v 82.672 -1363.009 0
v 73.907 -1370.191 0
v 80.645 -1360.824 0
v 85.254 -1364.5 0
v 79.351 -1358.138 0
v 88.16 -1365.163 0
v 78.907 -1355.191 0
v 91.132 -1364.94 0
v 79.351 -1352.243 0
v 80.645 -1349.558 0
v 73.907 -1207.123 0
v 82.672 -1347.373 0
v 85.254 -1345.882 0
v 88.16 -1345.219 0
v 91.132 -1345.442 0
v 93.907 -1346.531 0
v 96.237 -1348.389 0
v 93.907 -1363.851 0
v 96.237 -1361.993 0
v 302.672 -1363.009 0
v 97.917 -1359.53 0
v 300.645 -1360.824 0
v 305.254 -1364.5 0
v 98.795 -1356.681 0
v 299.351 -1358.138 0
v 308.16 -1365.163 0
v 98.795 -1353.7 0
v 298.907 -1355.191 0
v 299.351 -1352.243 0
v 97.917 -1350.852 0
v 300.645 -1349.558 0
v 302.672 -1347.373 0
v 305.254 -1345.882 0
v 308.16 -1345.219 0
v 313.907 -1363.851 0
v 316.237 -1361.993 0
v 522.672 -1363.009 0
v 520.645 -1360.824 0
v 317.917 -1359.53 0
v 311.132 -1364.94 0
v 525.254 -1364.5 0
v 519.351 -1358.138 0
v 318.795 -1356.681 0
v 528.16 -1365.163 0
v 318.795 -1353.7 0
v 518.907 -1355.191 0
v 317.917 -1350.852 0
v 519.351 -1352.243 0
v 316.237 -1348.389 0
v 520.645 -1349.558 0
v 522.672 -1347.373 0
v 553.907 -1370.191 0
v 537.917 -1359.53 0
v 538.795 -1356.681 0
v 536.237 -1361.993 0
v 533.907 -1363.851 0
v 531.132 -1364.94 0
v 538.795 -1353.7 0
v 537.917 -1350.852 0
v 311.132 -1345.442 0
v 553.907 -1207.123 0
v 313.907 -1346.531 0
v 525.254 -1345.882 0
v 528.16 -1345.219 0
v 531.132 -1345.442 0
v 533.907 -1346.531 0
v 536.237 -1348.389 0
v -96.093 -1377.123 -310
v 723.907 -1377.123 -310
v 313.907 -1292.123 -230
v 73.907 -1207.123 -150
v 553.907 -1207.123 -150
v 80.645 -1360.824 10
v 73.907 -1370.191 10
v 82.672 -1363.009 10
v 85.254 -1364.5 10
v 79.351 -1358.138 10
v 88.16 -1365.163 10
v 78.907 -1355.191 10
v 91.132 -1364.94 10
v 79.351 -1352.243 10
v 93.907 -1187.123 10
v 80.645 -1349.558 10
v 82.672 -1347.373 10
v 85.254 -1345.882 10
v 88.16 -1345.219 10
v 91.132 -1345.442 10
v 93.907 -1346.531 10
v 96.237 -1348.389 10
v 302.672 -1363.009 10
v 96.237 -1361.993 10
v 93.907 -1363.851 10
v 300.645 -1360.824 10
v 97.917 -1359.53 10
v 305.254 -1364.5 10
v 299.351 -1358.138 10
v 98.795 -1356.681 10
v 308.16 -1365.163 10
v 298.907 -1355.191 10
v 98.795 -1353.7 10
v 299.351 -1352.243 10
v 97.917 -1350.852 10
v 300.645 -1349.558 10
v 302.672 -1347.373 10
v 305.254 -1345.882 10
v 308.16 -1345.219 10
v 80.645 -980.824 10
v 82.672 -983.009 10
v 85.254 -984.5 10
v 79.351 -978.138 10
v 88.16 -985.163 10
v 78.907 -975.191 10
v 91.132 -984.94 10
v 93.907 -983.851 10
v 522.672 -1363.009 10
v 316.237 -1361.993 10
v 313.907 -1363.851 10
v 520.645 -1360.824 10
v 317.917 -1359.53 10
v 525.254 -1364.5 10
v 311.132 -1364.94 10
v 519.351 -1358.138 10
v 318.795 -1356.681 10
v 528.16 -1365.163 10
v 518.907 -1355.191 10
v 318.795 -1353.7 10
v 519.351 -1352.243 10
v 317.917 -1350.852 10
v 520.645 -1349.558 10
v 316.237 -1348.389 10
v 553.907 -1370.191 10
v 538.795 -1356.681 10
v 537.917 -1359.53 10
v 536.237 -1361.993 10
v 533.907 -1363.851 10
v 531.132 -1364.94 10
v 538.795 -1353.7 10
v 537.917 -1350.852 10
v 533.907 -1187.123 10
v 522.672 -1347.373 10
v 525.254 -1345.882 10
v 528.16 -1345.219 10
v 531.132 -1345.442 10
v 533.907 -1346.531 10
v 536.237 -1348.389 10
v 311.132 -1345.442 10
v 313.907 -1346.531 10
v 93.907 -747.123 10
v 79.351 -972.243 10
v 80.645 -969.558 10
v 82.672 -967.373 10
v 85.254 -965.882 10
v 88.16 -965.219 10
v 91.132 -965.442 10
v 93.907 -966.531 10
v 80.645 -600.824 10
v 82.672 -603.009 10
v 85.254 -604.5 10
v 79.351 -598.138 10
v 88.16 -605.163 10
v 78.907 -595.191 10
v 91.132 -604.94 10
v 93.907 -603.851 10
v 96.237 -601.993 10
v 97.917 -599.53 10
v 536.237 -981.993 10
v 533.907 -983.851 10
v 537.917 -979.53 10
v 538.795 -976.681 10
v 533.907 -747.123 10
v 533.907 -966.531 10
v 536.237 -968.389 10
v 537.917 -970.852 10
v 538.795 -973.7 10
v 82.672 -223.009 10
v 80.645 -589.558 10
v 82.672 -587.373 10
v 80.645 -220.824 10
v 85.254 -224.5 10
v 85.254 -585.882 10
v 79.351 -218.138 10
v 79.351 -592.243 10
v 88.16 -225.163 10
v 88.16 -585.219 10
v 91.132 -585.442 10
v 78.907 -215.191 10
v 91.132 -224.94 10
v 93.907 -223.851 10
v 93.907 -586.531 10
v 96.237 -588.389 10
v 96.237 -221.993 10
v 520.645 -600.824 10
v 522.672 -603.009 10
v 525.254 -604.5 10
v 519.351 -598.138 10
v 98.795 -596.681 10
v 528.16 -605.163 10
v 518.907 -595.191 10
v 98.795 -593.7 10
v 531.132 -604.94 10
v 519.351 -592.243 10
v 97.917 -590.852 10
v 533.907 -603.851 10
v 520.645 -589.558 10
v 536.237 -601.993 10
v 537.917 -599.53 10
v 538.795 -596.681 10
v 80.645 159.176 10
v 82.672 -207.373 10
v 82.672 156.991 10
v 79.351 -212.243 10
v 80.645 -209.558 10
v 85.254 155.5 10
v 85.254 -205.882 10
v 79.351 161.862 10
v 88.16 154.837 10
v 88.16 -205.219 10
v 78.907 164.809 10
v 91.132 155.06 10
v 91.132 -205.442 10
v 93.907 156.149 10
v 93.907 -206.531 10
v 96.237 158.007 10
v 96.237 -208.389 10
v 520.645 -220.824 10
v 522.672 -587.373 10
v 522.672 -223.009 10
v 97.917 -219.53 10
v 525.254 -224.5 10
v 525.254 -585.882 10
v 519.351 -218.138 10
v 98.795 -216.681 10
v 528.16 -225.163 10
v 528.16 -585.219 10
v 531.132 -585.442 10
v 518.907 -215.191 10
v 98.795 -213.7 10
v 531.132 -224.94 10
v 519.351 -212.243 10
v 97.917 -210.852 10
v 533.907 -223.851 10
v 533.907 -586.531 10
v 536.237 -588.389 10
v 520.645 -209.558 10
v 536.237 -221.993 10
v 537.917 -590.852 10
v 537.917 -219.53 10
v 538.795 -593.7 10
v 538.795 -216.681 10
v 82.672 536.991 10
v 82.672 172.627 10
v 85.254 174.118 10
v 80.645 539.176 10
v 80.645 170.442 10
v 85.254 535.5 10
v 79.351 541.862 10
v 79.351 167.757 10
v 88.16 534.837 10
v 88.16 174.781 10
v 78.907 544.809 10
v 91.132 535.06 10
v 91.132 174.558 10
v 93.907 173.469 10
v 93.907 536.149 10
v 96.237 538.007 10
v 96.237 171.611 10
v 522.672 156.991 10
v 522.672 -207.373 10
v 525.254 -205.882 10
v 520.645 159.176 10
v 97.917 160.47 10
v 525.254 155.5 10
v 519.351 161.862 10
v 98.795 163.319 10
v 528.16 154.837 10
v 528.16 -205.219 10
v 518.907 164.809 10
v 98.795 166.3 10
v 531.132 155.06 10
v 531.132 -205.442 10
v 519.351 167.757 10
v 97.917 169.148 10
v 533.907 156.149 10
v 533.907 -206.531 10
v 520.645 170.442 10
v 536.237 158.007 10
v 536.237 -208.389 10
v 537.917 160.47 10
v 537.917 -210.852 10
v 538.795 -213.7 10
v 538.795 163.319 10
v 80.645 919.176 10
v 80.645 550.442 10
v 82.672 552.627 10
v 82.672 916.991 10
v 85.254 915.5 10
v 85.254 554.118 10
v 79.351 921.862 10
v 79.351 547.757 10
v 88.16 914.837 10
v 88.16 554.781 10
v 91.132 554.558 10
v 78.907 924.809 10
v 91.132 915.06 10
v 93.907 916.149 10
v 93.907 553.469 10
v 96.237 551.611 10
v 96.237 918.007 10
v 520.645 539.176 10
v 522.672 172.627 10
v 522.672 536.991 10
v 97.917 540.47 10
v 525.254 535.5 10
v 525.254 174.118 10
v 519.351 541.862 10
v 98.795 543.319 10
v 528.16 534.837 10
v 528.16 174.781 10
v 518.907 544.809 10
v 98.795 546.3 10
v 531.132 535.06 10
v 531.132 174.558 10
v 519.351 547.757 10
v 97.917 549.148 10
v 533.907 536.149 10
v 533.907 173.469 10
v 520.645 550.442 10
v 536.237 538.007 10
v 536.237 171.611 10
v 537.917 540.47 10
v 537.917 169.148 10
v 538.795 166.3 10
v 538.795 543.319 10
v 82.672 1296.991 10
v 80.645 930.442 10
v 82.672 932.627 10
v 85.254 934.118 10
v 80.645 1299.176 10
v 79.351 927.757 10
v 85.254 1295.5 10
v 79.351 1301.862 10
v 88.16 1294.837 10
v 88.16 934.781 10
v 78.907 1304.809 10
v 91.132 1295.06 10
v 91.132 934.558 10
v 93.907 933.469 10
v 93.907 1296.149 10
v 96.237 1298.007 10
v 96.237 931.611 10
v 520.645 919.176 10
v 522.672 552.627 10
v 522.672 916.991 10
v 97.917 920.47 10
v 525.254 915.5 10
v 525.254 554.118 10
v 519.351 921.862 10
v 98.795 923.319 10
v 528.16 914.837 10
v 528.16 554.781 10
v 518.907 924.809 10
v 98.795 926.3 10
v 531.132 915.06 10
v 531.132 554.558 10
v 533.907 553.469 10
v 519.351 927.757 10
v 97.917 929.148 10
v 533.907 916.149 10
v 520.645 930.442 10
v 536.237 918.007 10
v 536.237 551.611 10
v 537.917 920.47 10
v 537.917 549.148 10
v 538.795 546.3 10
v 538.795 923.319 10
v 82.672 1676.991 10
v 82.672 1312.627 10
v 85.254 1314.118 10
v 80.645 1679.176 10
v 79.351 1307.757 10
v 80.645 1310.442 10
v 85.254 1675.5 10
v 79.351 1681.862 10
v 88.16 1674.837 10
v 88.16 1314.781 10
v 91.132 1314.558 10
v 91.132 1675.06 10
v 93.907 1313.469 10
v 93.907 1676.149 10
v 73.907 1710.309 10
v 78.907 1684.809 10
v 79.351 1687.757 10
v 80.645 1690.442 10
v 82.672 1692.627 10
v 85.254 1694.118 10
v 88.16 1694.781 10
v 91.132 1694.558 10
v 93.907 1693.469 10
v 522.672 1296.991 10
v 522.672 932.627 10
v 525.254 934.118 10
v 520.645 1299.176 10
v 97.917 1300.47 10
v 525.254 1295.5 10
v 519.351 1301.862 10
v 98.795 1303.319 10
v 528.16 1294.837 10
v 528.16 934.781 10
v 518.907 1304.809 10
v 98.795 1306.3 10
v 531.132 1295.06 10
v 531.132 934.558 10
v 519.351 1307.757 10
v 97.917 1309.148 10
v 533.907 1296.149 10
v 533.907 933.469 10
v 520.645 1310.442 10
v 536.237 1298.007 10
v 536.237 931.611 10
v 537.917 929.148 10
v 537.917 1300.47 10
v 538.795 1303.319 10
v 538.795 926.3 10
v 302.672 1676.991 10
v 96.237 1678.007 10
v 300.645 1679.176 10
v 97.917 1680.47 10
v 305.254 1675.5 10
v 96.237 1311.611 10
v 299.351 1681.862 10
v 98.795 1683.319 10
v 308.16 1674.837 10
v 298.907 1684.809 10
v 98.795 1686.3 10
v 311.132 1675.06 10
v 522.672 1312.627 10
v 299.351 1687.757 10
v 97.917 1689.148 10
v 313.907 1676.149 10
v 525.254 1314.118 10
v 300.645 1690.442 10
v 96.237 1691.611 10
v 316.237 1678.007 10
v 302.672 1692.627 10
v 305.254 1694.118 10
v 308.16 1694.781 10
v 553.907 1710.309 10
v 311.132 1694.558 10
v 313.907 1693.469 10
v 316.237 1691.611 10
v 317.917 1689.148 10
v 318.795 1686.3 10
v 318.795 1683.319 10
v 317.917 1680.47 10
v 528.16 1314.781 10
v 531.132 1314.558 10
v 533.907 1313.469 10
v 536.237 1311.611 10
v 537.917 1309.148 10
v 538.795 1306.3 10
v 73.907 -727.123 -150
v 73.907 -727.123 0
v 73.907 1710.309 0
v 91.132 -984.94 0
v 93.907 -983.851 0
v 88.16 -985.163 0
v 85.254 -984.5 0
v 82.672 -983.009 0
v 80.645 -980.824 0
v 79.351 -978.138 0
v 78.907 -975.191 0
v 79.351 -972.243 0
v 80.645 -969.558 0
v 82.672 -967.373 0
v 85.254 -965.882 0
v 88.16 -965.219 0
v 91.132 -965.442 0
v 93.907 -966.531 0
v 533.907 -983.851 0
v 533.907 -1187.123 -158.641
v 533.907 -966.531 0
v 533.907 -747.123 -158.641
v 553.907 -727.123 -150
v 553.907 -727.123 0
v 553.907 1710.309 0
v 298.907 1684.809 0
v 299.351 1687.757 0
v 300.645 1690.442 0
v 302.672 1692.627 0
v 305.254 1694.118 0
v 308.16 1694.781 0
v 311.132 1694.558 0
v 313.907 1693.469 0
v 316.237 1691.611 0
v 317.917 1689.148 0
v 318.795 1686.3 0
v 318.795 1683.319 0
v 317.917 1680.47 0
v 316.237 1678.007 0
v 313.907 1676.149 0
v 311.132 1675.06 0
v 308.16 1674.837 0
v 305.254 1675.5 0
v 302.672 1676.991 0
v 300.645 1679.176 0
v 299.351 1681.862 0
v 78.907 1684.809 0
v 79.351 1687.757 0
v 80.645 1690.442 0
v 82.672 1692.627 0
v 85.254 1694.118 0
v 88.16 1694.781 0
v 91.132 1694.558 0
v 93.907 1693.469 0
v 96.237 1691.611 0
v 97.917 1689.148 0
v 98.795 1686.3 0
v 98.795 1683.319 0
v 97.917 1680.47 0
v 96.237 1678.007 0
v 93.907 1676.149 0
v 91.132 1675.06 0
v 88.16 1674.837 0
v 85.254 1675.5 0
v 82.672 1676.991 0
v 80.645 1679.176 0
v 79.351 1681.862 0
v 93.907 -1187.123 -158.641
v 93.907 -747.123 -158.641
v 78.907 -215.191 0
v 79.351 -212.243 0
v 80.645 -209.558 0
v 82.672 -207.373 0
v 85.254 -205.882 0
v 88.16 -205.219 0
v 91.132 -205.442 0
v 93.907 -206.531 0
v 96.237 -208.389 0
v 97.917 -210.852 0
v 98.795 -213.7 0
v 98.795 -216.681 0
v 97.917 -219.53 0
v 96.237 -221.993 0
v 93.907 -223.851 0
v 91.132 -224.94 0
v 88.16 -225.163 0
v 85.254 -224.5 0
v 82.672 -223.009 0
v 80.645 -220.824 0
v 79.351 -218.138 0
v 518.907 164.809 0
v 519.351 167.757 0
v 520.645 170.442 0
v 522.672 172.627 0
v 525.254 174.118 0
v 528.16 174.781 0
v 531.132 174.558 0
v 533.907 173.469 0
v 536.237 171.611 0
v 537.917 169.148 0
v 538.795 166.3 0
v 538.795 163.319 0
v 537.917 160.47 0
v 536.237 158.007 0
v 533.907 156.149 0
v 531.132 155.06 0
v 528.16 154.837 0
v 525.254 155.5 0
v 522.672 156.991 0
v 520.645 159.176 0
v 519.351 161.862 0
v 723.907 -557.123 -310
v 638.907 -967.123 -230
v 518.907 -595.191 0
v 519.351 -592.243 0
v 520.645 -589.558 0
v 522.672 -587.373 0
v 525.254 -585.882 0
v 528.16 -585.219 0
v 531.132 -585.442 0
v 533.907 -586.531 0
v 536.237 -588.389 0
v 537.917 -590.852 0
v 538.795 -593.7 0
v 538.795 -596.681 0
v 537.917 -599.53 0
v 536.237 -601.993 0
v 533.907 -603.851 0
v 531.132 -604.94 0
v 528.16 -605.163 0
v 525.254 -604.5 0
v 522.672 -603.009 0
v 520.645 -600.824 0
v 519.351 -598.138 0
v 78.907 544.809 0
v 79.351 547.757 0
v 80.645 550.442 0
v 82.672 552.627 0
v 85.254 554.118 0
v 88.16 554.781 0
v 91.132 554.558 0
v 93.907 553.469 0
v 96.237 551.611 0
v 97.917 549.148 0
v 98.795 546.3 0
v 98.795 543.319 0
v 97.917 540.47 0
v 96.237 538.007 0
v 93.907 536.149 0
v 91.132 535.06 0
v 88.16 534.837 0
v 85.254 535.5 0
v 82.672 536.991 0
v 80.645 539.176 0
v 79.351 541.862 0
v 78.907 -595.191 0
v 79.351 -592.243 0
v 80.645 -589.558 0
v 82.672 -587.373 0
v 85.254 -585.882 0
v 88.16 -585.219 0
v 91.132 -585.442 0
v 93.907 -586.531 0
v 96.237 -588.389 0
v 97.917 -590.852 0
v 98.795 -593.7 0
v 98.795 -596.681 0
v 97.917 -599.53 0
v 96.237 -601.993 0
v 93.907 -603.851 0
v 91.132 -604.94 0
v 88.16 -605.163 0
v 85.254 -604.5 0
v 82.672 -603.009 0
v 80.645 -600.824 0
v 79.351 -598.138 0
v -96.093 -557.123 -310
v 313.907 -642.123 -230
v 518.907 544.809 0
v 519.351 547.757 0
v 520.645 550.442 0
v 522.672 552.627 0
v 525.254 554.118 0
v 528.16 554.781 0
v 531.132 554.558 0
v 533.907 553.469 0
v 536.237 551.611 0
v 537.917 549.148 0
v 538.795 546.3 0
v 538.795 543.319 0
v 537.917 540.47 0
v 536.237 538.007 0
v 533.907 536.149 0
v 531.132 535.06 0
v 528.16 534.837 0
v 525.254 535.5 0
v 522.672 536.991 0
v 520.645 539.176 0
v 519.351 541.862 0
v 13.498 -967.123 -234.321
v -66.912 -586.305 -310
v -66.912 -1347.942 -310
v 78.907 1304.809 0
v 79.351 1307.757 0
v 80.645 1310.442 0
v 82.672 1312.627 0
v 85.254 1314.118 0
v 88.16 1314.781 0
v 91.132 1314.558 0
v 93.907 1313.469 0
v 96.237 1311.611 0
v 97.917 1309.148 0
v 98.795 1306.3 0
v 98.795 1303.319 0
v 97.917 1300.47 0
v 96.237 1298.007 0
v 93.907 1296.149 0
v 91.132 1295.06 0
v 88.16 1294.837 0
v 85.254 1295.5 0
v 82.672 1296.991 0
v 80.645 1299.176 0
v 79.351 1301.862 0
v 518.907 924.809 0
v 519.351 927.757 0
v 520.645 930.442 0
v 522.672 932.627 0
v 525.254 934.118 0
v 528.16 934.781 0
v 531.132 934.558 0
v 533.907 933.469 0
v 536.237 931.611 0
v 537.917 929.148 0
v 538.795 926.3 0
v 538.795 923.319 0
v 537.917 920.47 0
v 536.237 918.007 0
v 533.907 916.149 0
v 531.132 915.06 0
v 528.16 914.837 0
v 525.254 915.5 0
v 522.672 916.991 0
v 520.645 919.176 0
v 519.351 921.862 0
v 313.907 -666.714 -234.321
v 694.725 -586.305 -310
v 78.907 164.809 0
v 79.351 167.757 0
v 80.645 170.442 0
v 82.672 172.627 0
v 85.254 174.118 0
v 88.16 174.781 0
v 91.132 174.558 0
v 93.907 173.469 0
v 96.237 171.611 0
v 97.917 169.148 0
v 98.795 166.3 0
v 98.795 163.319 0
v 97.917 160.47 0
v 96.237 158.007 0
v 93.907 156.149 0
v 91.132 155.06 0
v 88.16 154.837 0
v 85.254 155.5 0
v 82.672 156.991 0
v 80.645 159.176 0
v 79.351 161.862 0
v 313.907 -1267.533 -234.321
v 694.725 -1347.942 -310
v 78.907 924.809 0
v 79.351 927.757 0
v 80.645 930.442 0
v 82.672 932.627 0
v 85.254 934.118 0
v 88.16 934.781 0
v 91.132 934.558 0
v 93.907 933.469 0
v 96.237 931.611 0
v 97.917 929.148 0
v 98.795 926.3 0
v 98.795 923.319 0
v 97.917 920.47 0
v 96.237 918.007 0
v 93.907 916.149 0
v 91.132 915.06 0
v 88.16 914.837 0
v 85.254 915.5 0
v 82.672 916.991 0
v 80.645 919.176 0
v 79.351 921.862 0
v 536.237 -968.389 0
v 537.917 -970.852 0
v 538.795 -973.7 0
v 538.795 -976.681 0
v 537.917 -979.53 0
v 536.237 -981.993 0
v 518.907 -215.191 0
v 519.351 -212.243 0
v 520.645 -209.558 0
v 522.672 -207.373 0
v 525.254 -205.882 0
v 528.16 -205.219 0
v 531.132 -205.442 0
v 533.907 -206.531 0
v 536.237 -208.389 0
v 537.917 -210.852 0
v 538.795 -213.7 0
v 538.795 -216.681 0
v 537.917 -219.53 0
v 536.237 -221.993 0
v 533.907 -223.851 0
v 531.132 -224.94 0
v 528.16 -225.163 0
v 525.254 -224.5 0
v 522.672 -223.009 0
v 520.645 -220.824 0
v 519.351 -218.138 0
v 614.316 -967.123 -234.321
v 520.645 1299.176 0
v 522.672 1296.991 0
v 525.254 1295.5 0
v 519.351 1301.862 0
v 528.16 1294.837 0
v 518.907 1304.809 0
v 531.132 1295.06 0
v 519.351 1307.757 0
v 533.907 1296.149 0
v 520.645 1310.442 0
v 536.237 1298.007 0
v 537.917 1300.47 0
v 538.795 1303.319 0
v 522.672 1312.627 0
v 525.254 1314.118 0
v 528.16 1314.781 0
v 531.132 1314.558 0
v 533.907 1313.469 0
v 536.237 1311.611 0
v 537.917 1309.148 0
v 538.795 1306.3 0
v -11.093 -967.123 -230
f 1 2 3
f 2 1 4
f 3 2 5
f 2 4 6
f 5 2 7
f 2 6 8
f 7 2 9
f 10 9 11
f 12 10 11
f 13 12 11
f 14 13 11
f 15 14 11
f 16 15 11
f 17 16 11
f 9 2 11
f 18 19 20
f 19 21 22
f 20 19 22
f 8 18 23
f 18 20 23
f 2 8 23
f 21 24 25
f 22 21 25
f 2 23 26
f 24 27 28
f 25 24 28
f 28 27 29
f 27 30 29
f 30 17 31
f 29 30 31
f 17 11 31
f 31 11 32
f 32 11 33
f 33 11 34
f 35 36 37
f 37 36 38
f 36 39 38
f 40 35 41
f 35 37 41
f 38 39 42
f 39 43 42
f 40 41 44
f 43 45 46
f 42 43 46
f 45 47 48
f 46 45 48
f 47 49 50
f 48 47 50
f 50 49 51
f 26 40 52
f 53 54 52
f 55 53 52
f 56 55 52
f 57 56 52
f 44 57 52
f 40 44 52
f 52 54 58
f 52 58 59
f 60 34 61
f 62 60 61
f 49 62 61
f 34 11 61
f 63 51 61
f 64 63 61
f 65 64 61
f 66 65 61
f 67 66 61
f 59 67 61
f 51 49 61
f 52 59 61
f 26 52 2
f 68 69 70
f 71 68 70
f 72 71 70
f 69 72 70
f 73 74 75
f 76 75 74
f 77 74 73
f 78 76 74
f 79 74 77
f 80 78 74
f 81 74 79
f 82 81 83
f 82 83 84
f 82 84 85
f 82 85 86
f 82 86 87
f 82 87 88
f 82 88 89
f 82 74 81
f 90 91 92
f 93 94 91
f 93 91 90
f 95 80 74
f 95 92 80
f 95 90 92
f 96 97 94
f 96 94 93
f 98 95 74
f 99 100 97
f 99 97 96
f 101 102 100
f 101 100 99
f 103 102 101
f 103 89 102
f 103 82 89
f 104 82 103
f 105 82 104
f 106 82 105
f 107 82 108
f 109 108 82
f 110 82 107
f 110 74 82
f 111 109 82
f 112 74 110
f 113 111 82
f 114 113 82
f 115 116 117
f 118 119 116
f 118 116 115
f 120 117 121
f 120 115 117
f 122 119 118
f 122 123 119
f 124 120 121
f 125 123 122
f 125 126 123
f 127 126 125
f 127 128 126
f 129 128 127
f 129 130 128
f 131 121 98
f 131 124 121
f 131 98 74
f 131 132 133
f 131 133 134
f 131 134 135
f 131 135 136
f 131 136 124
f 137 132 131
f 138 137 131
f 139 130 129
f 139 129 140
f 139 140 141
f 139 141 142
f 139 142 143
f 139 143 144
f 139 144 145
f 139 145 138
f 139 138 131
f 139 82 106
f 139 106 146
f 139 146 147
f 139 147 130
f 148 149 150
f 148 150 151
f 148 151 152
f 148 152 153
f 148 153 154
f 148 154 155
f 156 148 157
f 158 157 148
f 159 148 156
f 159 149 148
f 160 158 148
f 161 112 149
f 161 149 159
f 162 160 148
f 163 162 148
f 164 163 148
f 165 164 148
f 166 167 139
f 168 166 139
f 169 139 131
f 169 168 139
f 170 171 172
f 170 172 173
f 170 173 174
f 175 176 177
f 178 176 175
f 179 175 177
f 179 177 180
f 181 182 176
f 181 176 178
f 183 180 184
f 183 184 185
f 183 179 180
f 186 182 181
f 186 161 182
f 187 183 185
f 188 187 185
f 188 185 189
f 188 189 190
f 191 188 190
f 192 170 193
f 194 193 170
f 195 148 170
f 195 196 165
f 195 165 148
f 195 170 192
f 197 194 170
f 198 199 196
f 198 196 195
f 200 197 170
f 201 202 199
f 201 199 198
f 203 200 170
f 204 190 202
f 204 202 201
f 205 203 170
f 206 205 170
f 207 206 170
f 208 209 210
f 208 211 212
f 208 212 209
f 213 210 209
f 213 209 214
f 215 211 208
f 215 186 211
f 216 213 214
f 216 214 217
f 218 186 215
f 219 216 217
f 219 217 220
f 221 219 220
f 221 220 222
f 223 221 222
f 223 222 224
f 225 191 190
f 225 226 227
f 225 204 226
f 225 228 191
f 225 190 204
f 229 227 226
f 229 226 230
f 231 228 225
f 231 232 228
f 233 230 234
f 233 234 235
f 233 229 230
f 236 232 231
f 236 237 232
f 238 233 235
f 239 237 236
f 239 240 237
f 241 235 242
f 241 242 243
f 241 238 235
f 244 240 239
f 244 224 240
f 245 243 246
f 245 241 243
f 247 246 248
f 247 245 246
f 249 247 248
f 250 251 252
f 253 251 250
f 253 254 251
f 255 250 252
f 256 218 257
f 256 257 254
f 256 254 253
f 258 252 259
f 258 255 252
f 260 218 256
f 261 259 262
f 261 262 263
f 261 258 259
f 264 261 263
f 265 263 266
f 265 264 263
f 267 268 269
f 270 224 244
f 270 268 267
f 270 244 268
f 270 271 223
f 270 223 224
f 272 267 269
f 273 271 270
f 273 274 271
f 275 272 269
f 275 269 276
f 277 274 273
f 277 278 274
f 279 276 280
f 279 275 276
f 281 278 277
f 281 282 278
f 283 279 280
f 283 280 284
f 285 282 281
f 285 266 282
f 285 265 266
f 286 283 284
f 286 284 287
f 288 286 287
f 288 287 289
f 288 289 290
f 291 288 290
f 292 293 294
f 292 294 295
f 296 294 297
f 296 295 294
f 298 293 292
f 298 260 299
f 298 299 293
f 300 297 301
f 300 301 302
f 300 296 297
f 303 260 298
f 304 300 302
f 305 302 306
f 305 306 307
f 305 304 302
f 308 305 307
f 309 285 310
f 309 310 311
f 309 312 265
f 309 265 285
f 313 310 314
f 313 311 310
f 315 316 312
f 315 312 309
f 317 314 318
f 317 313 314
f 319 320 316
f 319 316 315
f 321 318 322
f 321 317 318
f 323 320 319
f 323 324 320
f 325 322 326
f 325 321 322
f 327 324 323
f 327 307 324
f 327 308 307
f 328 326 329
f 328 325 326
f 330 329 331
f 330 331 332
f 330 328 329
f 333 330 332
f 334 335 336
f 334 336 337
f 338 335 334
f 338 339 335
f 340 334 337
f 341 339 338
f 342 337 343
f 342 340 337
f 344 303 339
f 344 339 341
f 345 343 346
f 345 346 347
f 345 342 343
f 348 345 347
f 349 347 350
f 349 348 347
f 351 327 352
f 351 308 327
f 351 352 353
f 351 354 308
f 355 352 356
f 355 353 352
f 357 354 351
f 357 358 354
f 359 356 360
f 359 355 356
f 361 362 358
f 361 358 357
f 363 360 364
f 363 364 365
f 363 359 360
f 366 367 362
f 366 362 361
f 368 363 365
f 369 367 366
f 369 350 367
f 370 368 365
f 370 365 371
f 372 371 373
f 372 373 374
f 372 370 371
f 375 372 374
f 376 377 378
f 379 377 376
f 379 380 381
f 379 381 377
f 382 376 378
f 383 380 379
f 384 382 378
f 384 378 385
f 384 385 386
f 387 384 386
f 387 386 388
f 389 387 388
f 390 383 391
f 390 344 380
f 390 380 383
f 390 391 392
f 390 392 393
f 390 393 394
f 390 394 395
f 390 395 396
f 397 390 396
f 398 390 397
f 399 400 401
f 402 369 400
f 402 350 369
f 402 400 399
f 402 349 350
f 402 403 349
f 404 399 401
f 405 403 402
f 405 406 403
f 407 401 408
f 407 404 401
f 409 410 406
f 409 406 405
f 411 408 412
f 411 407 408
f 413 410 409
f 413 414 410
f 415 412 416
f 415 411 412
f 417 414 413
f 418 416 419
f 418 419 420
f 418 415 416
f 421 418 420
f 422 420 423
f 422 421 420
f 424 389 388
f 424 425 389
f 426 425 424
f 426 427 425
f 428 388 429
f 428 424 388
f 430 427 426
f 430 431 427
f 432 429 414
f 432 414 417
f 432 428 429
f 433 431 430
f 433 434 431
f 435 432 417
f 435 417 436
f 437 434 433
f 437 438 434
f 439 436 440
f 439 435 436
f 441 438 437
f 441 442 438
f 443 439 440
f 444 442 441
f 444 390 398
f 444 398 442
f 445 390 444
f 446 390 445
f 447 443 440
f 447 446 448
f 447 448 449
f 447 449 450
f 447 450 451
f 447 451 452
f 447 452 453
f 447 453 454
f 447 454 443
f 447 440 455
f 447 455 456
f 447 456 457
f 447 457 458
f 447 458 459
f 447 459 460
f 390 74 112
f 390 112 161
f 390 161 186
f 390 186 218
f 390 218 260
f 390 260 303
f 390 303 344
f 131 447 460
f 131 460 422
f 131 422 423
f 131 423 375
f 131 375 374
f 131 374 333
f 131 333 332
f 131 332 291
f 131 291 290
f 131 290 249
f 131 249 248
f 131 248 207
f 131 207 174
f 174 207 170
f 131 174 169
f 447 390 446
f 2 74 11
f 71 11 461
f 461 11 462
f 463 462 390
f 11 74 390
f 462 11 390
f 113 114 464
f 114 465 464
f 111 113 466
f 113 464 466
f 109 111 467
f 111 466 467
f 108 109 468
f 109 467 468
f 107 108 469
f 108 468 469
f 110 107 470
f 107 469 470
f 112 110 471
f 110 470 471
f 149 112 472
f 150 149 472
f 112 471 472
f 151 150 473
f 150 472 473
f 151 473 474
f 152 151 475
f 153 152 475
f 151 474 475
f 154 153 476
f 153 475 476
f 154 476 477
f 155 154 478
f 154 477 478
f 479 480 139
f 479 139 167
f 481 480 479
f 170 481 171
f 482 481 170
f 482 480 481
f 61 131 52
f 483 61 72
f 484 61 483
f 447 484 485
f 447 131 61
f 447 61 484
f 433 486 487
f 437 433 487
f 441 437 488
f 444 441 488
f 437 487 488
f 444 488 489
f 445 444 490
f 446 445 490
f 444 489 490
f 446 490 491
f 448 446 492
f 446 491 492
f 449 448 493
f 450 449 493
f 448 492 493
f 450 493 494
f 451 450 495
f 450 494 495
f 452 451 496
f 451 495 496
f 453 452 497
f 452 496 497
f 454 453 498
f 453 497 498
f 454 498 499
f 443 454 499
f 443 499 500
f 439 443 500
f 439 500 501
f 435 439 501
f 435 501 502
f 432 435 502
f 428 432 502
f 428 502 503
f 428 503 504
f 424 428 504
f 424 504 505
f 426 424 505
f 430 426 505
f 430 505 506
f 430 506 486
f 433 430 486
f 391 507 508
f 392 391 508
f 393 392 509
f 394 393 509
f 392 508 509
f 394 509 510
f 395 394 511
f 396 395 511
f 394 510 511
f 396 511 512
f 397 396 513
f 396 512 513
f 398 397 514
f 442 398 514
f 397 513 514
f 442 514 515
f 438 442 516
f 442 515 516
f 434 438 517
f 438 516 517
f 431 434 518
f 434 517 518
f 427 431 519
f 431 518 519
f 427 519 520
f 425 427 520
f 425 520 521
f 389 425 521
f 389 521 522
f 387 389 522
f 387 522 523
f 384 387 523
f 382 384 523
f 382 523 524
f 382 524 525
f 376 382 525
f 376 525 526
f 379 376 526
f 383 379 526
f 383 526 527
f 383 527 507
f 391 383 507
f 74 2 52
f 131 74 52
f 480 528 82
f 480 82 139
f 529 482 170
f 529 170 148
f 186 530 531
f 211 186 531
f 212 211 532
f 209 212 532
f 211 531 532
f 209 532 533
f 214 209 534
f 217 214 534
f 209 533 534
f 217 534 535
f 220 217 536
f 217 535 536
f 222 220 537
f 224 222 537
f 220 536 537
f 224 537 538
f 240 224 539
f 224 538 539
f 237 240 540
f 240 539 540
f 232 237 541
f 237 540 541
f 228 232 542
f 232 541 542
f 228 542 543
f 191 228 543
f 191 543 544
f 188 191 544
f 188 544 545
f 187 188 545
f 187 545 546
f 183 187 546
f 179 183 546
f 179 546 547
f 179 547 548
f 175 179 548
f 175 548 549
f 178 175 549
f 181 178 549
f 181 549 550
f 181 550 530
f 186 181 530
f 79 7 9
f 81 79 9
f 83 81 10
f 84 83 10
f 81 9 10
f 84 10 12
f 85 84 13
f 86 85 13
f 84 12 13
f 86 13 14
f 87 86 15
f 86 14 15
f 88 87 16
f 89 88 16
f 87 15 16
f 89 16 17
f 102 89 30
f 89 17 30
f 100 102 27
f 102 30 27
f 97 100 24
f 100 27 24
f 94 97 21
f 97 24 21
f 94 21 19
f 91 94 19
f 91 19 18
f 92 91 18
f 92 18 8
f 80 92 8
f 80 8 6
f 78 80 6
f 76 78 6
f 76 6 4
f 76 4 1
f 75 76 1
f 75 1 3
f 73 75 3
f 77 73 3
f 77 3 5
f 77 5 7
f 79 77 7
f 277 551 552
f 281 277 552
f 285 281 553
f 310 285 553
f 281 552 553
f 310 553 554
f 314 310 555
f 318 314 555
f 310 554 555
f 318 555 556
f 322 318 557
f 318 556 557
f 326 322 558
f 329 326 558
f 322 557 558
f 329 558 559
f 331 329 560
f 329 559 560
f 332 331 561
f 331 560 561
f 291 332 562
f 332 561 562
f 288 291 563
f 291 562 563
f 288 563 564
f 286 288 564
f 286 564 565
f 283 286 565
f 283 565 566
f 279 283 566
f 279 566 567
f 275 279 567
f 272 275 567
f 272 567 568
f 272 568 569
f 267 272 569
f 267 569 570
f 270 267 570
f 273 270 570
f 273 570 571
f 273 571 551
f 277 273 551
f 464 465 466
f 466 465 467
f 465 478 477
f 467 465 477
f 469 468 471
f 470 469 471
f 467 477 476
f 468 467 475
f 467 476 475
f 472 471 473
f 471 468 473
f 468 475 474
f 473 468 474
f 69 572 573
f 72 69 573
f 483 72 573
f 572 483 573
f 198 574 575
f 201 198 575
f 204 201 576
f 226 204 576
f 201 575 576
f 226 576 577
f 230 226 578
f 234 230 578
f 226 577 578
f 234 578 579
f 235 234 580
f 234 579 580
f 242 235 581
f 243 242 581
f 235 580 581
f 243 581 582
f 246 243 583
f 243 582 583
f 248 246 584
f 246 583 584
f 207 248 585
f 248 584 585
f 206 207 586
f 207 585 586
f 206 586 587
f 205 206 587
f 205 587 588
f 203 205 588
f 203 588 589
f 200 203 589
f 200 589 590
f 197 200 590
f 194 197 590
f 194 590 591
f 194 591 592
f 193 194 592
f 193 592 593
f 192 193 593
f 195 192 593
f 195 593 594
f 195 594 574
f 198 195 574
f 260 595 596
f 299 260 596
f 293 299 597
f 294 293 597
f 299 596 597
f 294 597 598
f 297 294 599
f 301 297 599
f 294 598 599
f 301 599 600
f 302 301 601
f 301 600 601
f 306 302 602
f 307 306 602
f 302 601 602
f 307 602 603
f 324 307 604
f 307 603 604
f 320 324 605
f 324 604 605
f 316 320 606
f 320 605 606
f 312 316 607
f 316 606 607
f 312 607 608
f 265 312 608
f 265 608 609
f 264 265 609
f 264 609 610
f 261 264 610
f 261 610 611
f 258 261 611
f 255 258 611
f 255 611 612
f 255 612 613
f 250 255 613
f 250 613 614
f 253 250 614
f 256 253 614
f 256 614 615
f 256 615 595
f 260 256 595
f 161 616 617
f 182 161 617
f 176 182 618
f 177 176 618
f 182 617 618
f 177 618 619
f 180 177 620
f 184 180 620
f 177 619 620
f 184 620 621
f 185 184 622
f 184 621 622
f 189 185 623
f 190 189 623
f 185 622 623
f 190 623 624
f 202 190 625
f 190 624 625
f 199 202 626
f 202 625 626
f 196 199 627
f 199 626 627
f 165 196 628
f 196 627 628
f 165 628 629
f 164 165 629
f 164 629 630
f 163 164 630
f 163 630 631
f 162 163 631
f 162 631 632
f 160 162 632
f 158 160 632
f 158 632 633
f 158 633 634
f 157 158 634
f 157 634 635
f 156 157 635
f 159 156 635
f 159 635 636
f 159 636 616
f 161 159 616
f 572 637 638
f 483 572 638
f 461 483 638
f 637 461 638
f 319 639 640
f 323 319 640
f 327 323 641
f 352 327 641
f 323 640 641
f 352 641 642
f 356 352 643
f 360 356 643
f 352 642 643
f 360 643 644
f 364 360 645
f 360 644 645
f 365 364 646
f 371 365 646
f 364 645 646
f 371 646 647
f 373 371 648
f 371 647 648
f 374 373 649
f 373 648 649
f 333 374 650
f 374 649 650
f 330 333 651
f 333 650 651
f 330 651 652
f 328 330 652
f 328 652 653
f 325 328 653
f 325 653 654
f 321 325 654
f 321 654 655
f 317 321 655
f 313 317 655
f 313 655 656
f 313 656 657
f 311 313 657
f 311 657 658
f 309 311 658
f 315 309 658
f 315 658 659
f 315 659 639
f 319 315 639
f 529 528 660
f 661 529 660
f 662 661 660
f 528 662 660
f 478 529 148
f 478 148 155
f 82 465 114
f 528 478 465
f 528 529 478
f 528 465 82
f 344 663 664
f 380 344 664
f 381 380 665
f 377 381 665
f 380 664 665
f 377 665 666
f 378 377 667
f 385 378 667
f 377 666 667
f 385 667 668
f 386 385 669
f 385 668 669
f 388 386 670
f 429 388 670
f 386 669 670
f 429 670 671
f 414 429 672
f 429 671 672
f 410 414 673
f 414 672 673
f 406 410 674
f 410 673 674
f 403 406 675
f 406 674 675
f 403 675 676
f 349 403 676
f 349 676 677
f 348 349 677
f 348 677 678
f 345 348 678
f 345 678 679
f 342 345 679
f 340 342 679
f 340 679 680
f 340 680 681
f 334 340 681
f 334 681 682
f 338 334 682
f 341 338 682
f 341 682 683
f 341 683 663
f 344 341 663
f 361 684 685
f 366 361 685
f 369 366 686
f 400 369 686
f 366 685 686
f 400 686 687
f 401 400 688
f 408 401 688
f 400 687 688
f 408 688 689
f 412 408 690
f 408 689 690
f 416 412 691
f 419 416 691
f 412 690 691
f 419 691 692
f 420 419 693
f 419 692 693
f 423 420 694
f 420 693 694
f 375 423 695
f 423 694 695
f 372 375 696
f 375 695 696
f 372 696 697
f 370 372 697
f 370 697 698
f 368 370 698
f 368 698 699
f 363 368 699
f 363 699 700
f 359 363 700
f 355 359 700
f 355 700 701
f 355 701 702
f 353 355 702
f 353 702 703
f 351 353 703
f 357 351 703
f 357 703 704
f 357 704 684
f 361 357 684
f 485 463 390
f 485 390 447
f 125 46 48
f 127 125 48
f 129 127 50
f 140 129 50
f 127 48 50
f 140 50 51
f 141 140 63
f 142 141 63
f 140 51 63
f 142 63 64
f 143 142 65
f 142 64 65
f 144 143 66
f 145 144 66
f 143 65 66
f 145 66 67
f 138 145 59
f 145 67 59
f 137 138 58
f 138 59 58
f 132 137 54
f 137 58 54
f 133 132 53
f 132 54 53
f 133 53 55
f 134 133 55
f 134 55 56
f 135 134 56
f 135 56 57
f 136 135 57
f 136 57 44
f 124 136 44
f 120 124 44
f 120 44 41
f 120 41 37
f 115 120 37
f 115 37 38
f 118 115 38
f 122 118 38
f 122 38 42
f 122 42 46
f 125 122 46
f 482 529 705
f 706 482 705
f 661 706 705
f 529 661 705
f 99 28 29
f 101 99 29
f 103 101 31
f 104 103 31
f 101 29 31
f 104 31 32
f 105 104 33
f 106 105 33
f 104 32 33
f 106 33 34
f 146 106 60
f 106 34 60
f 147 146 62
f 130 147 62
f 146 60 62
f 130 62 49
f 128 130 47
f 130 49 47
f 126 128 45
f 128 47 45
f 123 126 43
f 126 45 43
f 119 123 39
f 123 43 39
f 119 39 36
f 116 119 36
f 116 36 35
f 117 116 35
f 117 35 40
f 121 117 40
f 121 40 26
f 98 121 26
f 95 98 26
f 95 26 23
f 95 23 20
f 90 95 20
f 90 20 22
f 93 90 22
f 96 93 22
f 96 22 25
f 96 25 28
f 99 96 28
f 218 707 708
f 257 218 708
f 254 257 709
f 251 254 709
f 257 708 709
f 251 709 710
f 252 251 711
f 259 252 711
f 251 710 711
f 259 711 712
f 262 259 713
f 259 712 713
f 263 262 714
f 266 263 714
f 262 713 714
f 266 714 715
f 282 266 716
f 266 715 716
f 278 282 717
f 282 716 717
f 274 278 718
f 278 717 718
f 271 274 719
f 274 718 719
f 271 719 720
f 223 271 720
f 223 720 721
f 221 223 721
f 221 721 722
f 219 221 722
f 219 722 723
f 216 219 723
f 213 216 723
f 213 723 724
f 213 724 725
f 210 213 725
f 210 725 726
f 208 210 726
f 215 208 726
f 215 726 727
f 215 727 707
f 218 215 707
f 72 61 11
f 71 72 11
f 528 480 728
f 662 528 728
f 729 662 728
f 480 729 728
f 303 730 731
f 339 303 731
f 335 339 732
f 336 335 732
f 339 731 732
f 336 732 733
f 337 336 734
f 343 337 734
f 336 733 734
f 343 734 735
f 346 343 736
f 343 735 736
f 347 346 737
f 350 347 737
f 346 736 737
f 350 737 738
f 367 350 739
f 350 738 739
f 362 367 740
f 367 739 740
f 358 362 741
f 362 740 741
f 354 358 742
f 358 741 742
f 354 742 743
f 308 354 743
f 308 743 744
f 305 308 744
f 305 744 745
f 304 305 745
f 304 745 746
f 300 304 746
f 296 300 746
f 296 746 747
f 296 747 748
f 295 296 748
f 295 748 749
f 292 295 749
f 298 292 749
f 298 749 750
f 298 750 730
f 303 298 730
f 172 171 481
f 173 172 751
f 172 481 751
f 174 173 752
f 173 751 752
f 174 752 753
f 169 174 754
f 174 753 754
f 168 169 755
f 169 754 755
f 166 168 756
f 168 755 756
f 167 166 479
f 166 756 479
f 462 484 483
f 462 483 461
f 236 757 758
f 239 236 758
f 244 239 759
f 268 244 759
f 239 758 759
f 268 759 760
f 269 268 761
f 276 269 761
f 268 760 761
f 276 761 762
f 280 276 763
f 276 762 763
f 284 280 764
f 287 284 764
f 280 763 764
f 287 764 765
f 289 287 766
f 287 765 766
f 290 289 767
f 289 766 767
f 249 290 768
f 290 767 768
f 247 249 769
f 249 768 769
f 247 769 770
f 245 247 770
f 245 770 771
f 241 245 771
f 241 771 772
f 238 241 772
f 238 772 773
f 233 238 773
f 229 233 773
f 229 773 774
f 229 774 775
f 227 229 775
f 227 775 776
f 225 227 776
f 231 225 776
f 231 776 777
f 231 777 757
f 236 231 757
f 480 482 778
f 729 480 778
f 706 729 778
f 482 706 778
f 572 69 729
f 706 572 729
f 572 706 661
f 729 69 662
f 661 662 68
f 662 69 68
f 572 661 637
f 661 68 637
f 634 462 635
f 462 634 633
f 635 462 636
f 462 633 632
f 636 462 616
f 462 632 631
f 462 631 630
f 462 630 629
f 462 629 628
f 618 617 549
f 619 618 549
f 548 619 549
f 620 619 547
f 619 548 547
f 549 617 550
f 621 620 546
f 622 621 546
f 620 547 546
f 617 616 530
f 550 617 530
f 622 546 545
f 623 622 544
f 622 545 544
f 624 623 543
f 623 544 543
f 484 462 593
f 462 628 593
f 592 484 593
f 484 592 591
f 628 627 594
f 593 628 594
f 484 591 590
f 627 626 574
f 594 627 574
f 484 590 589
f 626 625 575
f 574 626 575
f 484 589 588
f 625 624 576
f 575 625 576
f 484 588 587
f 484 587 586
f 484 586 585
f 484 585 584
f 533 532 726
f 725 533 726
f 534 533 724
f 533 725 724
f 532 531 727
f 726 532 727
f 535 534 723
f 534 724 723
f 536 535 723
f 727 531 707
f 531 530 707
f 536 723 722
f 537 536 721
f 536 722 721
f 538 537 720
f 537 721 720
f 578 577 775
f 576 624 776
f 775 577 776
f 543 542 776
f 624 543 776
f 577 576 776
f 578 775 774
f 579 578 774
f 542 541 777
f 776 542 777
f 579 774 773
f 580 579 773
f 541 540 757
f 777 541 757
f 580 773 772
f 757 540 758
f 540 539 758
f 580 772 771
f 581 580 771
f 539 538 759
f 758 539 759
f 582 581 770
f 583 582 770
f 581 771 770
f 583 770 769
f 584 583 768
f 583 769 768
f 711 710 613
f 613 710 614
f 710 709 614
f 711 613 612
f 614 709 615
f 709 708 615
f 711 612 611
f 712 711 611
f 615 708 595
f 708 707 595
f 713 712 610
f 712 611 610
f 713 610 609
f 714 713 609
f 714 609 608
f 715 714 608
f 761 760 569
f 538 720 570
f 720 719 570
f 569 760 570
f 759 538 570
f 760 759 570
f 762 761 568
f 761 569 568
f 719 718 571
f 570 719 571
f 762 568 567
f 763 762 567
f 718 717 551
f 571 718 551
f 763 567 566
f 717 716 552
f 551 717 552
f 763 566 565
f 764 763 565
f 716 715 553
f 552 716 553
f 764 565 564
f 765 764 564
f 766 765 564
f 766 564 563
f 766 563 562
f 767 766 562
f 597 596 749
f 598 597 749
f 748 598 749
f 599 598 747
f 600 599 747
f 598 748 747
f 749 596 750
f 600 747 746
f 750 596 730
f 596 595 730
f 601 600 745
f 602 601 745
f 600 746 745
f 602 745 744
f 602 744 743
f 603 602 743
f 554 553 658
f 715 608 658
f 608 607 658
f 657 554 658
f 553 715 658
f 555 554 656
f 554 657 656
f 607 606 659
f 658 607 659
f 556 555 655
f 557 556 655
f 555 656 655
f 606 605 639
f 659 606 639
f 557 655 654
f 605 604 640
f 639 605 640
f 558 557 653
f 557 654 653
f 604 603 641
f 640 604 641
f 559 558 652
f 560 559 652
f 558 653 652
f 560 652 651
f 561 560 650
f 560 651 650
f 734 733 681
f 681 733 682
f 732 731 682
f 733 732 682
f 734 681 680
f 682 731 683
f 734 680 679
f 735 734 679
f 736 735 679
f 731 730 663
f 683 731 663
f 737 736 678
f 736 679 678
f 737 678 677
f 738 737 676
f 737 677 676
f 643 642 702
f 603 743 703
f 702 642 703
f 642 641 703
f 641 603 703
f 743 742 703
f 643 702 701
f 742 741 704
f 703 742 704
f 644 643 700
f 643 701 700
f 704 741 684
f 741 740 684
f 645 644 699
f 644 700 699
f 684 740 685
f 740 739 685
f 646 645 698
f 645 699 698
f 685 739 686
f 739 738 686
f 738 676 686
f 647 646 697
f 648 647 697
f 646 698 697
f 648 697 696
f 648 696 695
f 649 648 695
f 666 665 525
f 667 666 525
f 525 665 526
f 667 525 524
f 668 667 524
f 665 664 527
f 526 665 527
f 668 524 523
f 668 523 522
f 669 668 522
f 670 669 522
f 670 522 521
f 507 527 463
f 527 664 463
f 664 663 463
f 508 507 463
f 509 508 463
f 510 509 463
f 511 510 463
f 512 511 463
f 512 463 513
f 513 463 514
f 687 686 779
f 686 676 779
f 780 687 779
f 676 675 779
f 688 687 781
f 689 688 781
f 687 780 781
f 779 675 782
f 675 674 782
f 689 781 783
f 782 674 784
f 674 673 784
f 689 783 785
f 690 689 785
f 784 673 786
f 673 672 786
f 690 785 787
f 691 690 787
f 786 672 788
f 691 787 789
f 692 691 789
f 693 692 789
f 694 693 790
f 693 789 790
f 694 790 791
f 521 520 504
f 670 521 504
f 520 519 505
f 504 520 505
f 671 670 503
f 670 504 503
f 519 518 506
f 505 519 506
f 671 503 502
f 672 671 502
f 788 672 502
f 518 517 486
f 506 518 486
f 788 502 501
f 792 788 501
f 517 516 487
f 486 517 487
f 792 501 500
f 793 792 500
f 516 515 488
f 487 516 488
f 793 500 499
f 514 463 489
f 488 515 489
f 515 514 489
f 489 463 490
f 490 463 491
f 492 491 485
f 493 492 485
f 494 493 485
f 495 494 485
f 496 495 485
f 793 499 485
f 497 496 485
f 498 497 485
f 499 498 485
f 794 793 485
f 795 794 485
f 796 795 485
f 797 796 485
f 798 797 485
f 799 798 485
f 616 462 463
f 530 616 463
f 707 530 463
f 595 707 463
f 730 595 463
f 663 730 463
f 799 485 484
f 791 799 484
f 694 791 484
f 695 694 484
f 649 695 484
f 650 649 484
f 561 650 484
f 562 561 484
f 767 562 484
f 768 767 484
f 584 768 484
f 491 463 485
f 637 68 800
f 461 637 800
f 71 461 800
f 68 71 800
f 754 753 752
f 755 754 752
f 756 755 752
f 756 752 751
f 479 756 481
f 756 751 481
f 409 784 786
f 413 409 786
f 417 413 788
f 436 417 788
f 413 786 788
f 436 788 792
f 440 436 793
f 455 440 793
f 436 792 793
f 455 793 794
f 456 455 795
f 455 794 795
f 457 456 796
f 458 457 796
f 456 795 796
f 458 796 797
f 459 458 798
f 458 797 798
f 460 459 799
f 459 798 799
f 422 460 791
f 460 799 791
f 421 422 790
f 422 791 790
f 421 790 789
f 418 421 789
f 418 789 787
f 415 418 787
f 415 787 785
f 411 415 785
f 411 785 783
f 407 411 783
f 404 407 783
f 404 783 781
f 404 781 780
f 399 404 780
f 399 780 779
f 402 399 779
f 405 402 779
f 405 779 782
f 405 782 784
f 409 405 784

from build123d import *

# Parameters (mm, degrees)
SKETCH1_W           = 480
SKETCH1_H           = 3080.5
BOSS_EXTRUDE1_DEPTH = 10
SKETCH2_R           = 10
CUT_EXTRUDE1_DEPTH  = 1798.795950849
SKETCH3_W           = 480
SKETCH3_H           = 480
BOSS_EXTRUDE2_DEPTH = 150
SHELL3_START        = -310
SHELL3_DEPTH        = 300
SHELL3_2_DEPTH      = 290
SKETCH7_W           = 440
SKETCH7_H           = 440
CUT_EXTRUDE6_DEPTH  = 1885.56855559


with BuildPart() as part:
    # Sketch1 → Boss-Extrude1 (new body)
    with BuildSketch(Plane.XY):
        with Locations((313.906940063, 170.059148265)):
            Rectangle(SKETCH1_W, SKETCH1_H)
    extrude(amount=BOSS_EXTRUDE1_DEPTH)

    # Sketch2 → Cut-Extrude1 (cut, through all)
    with BuildSketch(Plane(origin=(0, 0, 0), x_dir=(-1, 0, 0), z_dir=(0, 0, -1))):
        with Locations((-88.906940063, 544.809148265)):
            Circle(SKETCH2_R)
        with Locations((-88.906940063, -1355.190851735)):
            Circle(SKETCH2_R)
        with Locations((-88.906940063, 1684.809148265)):
            Circle(SKETCH2_R)
        with Locations((-308.906940063, 1684.809148265)):
            Circle(SKETCH2_R)
        with Locations((-528.906940063, 1304.809148265)):
            Circle(SKETCH2_R)
        with Locations((-88.906940063, 1304.809148265)):
            Circle(SKETCH2_R)
        with Locations((-88.906940063, 924.809148265)):
            Circle(SKETCH2_R)
        with Locations((-528.906940063, 924.809148265)):
            Circle(SKETCH2_R)
        with Locations((-528.906940063, 544.809148265)):
            Circle(SKETCH2_R)
        with Locations((-88.906940063, 164.809148265)):
            Circle(SKETCH2_R)
        with Locations((-528.906940063, 164.809148265)):
            Circle(SKETCH2_R)
        with Locations((-88.906940063, -215.190851735)):
            Circle(SKETCH2_R)
        with Locations((-528.906940063, -215.190851735)):
            Circle(SKETCH2_R)
        with Locations((-88.906940063, -595.190851735)):
            Circle(SKETCH2_R)
        with Locations((-528.906940063, -595.190851735)):
            Circle(SKETCH2_R)
        with Locations((-528.906940063, -975.190851735)):
            Circle(SKETCH2_R)
        with Locations((-88.906940063, -975.190851735)):
            Circle(SKETCH2_R)
        with Locations((-308.906940063, -1355.190851735)):
            Circle(SKETCH2_R)
        with Locations((-528.906940063, -1355.190851735)):
            Circle(SKETCH2_R)
    extrude(amount=-CUT_EXTRUDE1_DEPTH, mode=Mode.SUBTRACT)

    # Sketch3 → Boss-Extrude2 (add)
    with BuildSketch(Plane(origin=(0, 0, 0), x_dir=(-1, 0, 0), z_dir=(0, 0, -1))):
        with Locations((-313.906940063, -967.123472678)):
            Rectangle(SKETCH3_W, SKETCH3_H)
    extrude(amount=BOSS_EXTRUDE2_DEPTH)

    # Sketch5 → Loft1 section 0
    with BuildSketch(Plane(origin=(0, 0, -310), x_dir=(-1, 0, 0), z_dir=(0, 0, -1))):
        with BuildLine():
            Line((-723.906940063, -1377.123472678), (96.093059937, -1377.123472678))
            Line((96.093059937, -1377.123472678), (96.093059937, -557.123472678))
            Line((96.093059937, -557.123472678), (-723.906940063, -557.123472678))
            Line((-723.906940063, -557.123472678), (-723.906940063, -1377.123472678))
        make_face()
    # Sketch4 → Loft1 section 1
    with BuildSketch(Plane(origin=(0, 0, -150), x_dir=(-1, 0, 0), z_dir=(0, 0, -1))):
        with BuildLine():
            Line((-553.906940063, -1207.123472678), (-73.906940063, -1207.123472678))
            Line((-73.906940063, -1207.123472678), (-73.906940063, -727.123472678))
            Line((-73.906940063, -727.123472678), (-553.906940063, -727.123472678))
            Line((-553.906940063, -727.123472678), (-553.906940063, -1207.123472678))
        make_face()
    loft()

    # Shell3: read off the stored shape, not the designer's step
    # Shell3 outline → Shell3 (cut)
    with BuildSketch(Plane.XY.offset(SHELL3_START)):
        with BuildLine():
            Line((93.906940063, -1004.771250651), (93.906940063, -1187.123472678))
            Line((93.906940063, -1187.123472678), (533.906940063, -1187.123472678))
            Line((533.906940063, -1187.123472678), (533.906940063, -1004.771250651))
            ThreePointArc((533.906940063, -1004.771250651), (498.906940063, -975.190851736), (533.906940063, -945.61045282))
            Line((533.906940063, -945.61045282), (533.906940063, -747.123472678))
            Line((533.906940063, -747.123472678), (93.906940063, -747.123472678))
            Line((93.906940063, -747.123472678), (93.906940063, -945.61045282))
            ThreePointArc((93.906940063, -945.61045282), (118.906940063, -975.190851736), (93.906940063, -1004.771250651))
        make_face()
    extrude(amount=SHELL3_DEPTH, mode=Mode.SUBTRACT)

    # Shell3 2 outline → Shell3 2 (cut)
    with BuildSketch(Plane.XY.offset(SHELL3_START)):
        with BuildLine():
            Line((93.906940063, -945.61045282), (93.906940063, -1004.771250651))
            ThreePointArc((93.906940063, -1004.771250651), (118.906940063, -975.190851736), (93.906940063, -945.61045282))
        make_face()
        with BuildLine():
            ThreePointArc((533.906940063, -945.61045282), (498.906940063, -975.190851736), (533.906940063, -1004.771250651))
            Line((533.906940063, -1004.771250651), (533.906940063, -945.61045282))
        make_face()
    extrude(amount=SHELL3_2_DEPTH, mode=Mode.SUBTRACT)

    # Shell3 3: loft between two sections, ruled curve by curve
    shell3_3_from = [
        Edge.make_line((533.906940063, -1187.123472678, -158.641453012), (93.906940063, -1187.123472678, -158.641453012)),
        Edge.make_line((93.906940063, -1187.123472678, -158.641453012), (93.906940063, -747.123472678, -158.641453012)),
        Edge.make_line((533.906940063, -747.123472678, -158.641453012), (533.906940063, -1187.123472678, -158.641453012)),
        Edge.make_line((93.906940063, -747.123472678, -158.641453012), (533.906940063, -747.123472678, -158.641453012)),
    ]
    shell3_3_to = [
        Edge.make_line((694.725396238, -1347.941928853, -310), (-66.911516112, -1347.941928853, -310)),
        Edge.make_line((-66.911516112, -1347.941928853, -310), (-66.911516112, -586.305016503, -310)),
        Edge.make_line((694.725396238, -586.305016503, -310), (694.725396238, -1347.941928853, -310)),
        Edge.make_line((-66.911516112, -586.305016503, -310), (694.725396238, -586.305016503, -310)),
    ]
    shell3_3 = Solid(Shell([*[Face.make_surface_from_curves(shell3_3_from[k], shell3_3_to[k]) for k in range(4)], Face(Wire(shell3_3_from)), Face(Wire(shell3_3_to))]))
    add(shell3_3, mode=Mode.SUBTRACT)

    # Sketch7 → Cut-Extrude6 (cut, through all)
    with BuildSketch(Plane.XY.offset(10)):
        with Locations((313.906940063, -967.123472678)):
            Rectangle(SKETCH7_W, SKETCH7_H)
    extrude(amount=-CUT_EXTRUDE6_DEPTH, mode=Mode.SUBTRACT)


solid = part.part
